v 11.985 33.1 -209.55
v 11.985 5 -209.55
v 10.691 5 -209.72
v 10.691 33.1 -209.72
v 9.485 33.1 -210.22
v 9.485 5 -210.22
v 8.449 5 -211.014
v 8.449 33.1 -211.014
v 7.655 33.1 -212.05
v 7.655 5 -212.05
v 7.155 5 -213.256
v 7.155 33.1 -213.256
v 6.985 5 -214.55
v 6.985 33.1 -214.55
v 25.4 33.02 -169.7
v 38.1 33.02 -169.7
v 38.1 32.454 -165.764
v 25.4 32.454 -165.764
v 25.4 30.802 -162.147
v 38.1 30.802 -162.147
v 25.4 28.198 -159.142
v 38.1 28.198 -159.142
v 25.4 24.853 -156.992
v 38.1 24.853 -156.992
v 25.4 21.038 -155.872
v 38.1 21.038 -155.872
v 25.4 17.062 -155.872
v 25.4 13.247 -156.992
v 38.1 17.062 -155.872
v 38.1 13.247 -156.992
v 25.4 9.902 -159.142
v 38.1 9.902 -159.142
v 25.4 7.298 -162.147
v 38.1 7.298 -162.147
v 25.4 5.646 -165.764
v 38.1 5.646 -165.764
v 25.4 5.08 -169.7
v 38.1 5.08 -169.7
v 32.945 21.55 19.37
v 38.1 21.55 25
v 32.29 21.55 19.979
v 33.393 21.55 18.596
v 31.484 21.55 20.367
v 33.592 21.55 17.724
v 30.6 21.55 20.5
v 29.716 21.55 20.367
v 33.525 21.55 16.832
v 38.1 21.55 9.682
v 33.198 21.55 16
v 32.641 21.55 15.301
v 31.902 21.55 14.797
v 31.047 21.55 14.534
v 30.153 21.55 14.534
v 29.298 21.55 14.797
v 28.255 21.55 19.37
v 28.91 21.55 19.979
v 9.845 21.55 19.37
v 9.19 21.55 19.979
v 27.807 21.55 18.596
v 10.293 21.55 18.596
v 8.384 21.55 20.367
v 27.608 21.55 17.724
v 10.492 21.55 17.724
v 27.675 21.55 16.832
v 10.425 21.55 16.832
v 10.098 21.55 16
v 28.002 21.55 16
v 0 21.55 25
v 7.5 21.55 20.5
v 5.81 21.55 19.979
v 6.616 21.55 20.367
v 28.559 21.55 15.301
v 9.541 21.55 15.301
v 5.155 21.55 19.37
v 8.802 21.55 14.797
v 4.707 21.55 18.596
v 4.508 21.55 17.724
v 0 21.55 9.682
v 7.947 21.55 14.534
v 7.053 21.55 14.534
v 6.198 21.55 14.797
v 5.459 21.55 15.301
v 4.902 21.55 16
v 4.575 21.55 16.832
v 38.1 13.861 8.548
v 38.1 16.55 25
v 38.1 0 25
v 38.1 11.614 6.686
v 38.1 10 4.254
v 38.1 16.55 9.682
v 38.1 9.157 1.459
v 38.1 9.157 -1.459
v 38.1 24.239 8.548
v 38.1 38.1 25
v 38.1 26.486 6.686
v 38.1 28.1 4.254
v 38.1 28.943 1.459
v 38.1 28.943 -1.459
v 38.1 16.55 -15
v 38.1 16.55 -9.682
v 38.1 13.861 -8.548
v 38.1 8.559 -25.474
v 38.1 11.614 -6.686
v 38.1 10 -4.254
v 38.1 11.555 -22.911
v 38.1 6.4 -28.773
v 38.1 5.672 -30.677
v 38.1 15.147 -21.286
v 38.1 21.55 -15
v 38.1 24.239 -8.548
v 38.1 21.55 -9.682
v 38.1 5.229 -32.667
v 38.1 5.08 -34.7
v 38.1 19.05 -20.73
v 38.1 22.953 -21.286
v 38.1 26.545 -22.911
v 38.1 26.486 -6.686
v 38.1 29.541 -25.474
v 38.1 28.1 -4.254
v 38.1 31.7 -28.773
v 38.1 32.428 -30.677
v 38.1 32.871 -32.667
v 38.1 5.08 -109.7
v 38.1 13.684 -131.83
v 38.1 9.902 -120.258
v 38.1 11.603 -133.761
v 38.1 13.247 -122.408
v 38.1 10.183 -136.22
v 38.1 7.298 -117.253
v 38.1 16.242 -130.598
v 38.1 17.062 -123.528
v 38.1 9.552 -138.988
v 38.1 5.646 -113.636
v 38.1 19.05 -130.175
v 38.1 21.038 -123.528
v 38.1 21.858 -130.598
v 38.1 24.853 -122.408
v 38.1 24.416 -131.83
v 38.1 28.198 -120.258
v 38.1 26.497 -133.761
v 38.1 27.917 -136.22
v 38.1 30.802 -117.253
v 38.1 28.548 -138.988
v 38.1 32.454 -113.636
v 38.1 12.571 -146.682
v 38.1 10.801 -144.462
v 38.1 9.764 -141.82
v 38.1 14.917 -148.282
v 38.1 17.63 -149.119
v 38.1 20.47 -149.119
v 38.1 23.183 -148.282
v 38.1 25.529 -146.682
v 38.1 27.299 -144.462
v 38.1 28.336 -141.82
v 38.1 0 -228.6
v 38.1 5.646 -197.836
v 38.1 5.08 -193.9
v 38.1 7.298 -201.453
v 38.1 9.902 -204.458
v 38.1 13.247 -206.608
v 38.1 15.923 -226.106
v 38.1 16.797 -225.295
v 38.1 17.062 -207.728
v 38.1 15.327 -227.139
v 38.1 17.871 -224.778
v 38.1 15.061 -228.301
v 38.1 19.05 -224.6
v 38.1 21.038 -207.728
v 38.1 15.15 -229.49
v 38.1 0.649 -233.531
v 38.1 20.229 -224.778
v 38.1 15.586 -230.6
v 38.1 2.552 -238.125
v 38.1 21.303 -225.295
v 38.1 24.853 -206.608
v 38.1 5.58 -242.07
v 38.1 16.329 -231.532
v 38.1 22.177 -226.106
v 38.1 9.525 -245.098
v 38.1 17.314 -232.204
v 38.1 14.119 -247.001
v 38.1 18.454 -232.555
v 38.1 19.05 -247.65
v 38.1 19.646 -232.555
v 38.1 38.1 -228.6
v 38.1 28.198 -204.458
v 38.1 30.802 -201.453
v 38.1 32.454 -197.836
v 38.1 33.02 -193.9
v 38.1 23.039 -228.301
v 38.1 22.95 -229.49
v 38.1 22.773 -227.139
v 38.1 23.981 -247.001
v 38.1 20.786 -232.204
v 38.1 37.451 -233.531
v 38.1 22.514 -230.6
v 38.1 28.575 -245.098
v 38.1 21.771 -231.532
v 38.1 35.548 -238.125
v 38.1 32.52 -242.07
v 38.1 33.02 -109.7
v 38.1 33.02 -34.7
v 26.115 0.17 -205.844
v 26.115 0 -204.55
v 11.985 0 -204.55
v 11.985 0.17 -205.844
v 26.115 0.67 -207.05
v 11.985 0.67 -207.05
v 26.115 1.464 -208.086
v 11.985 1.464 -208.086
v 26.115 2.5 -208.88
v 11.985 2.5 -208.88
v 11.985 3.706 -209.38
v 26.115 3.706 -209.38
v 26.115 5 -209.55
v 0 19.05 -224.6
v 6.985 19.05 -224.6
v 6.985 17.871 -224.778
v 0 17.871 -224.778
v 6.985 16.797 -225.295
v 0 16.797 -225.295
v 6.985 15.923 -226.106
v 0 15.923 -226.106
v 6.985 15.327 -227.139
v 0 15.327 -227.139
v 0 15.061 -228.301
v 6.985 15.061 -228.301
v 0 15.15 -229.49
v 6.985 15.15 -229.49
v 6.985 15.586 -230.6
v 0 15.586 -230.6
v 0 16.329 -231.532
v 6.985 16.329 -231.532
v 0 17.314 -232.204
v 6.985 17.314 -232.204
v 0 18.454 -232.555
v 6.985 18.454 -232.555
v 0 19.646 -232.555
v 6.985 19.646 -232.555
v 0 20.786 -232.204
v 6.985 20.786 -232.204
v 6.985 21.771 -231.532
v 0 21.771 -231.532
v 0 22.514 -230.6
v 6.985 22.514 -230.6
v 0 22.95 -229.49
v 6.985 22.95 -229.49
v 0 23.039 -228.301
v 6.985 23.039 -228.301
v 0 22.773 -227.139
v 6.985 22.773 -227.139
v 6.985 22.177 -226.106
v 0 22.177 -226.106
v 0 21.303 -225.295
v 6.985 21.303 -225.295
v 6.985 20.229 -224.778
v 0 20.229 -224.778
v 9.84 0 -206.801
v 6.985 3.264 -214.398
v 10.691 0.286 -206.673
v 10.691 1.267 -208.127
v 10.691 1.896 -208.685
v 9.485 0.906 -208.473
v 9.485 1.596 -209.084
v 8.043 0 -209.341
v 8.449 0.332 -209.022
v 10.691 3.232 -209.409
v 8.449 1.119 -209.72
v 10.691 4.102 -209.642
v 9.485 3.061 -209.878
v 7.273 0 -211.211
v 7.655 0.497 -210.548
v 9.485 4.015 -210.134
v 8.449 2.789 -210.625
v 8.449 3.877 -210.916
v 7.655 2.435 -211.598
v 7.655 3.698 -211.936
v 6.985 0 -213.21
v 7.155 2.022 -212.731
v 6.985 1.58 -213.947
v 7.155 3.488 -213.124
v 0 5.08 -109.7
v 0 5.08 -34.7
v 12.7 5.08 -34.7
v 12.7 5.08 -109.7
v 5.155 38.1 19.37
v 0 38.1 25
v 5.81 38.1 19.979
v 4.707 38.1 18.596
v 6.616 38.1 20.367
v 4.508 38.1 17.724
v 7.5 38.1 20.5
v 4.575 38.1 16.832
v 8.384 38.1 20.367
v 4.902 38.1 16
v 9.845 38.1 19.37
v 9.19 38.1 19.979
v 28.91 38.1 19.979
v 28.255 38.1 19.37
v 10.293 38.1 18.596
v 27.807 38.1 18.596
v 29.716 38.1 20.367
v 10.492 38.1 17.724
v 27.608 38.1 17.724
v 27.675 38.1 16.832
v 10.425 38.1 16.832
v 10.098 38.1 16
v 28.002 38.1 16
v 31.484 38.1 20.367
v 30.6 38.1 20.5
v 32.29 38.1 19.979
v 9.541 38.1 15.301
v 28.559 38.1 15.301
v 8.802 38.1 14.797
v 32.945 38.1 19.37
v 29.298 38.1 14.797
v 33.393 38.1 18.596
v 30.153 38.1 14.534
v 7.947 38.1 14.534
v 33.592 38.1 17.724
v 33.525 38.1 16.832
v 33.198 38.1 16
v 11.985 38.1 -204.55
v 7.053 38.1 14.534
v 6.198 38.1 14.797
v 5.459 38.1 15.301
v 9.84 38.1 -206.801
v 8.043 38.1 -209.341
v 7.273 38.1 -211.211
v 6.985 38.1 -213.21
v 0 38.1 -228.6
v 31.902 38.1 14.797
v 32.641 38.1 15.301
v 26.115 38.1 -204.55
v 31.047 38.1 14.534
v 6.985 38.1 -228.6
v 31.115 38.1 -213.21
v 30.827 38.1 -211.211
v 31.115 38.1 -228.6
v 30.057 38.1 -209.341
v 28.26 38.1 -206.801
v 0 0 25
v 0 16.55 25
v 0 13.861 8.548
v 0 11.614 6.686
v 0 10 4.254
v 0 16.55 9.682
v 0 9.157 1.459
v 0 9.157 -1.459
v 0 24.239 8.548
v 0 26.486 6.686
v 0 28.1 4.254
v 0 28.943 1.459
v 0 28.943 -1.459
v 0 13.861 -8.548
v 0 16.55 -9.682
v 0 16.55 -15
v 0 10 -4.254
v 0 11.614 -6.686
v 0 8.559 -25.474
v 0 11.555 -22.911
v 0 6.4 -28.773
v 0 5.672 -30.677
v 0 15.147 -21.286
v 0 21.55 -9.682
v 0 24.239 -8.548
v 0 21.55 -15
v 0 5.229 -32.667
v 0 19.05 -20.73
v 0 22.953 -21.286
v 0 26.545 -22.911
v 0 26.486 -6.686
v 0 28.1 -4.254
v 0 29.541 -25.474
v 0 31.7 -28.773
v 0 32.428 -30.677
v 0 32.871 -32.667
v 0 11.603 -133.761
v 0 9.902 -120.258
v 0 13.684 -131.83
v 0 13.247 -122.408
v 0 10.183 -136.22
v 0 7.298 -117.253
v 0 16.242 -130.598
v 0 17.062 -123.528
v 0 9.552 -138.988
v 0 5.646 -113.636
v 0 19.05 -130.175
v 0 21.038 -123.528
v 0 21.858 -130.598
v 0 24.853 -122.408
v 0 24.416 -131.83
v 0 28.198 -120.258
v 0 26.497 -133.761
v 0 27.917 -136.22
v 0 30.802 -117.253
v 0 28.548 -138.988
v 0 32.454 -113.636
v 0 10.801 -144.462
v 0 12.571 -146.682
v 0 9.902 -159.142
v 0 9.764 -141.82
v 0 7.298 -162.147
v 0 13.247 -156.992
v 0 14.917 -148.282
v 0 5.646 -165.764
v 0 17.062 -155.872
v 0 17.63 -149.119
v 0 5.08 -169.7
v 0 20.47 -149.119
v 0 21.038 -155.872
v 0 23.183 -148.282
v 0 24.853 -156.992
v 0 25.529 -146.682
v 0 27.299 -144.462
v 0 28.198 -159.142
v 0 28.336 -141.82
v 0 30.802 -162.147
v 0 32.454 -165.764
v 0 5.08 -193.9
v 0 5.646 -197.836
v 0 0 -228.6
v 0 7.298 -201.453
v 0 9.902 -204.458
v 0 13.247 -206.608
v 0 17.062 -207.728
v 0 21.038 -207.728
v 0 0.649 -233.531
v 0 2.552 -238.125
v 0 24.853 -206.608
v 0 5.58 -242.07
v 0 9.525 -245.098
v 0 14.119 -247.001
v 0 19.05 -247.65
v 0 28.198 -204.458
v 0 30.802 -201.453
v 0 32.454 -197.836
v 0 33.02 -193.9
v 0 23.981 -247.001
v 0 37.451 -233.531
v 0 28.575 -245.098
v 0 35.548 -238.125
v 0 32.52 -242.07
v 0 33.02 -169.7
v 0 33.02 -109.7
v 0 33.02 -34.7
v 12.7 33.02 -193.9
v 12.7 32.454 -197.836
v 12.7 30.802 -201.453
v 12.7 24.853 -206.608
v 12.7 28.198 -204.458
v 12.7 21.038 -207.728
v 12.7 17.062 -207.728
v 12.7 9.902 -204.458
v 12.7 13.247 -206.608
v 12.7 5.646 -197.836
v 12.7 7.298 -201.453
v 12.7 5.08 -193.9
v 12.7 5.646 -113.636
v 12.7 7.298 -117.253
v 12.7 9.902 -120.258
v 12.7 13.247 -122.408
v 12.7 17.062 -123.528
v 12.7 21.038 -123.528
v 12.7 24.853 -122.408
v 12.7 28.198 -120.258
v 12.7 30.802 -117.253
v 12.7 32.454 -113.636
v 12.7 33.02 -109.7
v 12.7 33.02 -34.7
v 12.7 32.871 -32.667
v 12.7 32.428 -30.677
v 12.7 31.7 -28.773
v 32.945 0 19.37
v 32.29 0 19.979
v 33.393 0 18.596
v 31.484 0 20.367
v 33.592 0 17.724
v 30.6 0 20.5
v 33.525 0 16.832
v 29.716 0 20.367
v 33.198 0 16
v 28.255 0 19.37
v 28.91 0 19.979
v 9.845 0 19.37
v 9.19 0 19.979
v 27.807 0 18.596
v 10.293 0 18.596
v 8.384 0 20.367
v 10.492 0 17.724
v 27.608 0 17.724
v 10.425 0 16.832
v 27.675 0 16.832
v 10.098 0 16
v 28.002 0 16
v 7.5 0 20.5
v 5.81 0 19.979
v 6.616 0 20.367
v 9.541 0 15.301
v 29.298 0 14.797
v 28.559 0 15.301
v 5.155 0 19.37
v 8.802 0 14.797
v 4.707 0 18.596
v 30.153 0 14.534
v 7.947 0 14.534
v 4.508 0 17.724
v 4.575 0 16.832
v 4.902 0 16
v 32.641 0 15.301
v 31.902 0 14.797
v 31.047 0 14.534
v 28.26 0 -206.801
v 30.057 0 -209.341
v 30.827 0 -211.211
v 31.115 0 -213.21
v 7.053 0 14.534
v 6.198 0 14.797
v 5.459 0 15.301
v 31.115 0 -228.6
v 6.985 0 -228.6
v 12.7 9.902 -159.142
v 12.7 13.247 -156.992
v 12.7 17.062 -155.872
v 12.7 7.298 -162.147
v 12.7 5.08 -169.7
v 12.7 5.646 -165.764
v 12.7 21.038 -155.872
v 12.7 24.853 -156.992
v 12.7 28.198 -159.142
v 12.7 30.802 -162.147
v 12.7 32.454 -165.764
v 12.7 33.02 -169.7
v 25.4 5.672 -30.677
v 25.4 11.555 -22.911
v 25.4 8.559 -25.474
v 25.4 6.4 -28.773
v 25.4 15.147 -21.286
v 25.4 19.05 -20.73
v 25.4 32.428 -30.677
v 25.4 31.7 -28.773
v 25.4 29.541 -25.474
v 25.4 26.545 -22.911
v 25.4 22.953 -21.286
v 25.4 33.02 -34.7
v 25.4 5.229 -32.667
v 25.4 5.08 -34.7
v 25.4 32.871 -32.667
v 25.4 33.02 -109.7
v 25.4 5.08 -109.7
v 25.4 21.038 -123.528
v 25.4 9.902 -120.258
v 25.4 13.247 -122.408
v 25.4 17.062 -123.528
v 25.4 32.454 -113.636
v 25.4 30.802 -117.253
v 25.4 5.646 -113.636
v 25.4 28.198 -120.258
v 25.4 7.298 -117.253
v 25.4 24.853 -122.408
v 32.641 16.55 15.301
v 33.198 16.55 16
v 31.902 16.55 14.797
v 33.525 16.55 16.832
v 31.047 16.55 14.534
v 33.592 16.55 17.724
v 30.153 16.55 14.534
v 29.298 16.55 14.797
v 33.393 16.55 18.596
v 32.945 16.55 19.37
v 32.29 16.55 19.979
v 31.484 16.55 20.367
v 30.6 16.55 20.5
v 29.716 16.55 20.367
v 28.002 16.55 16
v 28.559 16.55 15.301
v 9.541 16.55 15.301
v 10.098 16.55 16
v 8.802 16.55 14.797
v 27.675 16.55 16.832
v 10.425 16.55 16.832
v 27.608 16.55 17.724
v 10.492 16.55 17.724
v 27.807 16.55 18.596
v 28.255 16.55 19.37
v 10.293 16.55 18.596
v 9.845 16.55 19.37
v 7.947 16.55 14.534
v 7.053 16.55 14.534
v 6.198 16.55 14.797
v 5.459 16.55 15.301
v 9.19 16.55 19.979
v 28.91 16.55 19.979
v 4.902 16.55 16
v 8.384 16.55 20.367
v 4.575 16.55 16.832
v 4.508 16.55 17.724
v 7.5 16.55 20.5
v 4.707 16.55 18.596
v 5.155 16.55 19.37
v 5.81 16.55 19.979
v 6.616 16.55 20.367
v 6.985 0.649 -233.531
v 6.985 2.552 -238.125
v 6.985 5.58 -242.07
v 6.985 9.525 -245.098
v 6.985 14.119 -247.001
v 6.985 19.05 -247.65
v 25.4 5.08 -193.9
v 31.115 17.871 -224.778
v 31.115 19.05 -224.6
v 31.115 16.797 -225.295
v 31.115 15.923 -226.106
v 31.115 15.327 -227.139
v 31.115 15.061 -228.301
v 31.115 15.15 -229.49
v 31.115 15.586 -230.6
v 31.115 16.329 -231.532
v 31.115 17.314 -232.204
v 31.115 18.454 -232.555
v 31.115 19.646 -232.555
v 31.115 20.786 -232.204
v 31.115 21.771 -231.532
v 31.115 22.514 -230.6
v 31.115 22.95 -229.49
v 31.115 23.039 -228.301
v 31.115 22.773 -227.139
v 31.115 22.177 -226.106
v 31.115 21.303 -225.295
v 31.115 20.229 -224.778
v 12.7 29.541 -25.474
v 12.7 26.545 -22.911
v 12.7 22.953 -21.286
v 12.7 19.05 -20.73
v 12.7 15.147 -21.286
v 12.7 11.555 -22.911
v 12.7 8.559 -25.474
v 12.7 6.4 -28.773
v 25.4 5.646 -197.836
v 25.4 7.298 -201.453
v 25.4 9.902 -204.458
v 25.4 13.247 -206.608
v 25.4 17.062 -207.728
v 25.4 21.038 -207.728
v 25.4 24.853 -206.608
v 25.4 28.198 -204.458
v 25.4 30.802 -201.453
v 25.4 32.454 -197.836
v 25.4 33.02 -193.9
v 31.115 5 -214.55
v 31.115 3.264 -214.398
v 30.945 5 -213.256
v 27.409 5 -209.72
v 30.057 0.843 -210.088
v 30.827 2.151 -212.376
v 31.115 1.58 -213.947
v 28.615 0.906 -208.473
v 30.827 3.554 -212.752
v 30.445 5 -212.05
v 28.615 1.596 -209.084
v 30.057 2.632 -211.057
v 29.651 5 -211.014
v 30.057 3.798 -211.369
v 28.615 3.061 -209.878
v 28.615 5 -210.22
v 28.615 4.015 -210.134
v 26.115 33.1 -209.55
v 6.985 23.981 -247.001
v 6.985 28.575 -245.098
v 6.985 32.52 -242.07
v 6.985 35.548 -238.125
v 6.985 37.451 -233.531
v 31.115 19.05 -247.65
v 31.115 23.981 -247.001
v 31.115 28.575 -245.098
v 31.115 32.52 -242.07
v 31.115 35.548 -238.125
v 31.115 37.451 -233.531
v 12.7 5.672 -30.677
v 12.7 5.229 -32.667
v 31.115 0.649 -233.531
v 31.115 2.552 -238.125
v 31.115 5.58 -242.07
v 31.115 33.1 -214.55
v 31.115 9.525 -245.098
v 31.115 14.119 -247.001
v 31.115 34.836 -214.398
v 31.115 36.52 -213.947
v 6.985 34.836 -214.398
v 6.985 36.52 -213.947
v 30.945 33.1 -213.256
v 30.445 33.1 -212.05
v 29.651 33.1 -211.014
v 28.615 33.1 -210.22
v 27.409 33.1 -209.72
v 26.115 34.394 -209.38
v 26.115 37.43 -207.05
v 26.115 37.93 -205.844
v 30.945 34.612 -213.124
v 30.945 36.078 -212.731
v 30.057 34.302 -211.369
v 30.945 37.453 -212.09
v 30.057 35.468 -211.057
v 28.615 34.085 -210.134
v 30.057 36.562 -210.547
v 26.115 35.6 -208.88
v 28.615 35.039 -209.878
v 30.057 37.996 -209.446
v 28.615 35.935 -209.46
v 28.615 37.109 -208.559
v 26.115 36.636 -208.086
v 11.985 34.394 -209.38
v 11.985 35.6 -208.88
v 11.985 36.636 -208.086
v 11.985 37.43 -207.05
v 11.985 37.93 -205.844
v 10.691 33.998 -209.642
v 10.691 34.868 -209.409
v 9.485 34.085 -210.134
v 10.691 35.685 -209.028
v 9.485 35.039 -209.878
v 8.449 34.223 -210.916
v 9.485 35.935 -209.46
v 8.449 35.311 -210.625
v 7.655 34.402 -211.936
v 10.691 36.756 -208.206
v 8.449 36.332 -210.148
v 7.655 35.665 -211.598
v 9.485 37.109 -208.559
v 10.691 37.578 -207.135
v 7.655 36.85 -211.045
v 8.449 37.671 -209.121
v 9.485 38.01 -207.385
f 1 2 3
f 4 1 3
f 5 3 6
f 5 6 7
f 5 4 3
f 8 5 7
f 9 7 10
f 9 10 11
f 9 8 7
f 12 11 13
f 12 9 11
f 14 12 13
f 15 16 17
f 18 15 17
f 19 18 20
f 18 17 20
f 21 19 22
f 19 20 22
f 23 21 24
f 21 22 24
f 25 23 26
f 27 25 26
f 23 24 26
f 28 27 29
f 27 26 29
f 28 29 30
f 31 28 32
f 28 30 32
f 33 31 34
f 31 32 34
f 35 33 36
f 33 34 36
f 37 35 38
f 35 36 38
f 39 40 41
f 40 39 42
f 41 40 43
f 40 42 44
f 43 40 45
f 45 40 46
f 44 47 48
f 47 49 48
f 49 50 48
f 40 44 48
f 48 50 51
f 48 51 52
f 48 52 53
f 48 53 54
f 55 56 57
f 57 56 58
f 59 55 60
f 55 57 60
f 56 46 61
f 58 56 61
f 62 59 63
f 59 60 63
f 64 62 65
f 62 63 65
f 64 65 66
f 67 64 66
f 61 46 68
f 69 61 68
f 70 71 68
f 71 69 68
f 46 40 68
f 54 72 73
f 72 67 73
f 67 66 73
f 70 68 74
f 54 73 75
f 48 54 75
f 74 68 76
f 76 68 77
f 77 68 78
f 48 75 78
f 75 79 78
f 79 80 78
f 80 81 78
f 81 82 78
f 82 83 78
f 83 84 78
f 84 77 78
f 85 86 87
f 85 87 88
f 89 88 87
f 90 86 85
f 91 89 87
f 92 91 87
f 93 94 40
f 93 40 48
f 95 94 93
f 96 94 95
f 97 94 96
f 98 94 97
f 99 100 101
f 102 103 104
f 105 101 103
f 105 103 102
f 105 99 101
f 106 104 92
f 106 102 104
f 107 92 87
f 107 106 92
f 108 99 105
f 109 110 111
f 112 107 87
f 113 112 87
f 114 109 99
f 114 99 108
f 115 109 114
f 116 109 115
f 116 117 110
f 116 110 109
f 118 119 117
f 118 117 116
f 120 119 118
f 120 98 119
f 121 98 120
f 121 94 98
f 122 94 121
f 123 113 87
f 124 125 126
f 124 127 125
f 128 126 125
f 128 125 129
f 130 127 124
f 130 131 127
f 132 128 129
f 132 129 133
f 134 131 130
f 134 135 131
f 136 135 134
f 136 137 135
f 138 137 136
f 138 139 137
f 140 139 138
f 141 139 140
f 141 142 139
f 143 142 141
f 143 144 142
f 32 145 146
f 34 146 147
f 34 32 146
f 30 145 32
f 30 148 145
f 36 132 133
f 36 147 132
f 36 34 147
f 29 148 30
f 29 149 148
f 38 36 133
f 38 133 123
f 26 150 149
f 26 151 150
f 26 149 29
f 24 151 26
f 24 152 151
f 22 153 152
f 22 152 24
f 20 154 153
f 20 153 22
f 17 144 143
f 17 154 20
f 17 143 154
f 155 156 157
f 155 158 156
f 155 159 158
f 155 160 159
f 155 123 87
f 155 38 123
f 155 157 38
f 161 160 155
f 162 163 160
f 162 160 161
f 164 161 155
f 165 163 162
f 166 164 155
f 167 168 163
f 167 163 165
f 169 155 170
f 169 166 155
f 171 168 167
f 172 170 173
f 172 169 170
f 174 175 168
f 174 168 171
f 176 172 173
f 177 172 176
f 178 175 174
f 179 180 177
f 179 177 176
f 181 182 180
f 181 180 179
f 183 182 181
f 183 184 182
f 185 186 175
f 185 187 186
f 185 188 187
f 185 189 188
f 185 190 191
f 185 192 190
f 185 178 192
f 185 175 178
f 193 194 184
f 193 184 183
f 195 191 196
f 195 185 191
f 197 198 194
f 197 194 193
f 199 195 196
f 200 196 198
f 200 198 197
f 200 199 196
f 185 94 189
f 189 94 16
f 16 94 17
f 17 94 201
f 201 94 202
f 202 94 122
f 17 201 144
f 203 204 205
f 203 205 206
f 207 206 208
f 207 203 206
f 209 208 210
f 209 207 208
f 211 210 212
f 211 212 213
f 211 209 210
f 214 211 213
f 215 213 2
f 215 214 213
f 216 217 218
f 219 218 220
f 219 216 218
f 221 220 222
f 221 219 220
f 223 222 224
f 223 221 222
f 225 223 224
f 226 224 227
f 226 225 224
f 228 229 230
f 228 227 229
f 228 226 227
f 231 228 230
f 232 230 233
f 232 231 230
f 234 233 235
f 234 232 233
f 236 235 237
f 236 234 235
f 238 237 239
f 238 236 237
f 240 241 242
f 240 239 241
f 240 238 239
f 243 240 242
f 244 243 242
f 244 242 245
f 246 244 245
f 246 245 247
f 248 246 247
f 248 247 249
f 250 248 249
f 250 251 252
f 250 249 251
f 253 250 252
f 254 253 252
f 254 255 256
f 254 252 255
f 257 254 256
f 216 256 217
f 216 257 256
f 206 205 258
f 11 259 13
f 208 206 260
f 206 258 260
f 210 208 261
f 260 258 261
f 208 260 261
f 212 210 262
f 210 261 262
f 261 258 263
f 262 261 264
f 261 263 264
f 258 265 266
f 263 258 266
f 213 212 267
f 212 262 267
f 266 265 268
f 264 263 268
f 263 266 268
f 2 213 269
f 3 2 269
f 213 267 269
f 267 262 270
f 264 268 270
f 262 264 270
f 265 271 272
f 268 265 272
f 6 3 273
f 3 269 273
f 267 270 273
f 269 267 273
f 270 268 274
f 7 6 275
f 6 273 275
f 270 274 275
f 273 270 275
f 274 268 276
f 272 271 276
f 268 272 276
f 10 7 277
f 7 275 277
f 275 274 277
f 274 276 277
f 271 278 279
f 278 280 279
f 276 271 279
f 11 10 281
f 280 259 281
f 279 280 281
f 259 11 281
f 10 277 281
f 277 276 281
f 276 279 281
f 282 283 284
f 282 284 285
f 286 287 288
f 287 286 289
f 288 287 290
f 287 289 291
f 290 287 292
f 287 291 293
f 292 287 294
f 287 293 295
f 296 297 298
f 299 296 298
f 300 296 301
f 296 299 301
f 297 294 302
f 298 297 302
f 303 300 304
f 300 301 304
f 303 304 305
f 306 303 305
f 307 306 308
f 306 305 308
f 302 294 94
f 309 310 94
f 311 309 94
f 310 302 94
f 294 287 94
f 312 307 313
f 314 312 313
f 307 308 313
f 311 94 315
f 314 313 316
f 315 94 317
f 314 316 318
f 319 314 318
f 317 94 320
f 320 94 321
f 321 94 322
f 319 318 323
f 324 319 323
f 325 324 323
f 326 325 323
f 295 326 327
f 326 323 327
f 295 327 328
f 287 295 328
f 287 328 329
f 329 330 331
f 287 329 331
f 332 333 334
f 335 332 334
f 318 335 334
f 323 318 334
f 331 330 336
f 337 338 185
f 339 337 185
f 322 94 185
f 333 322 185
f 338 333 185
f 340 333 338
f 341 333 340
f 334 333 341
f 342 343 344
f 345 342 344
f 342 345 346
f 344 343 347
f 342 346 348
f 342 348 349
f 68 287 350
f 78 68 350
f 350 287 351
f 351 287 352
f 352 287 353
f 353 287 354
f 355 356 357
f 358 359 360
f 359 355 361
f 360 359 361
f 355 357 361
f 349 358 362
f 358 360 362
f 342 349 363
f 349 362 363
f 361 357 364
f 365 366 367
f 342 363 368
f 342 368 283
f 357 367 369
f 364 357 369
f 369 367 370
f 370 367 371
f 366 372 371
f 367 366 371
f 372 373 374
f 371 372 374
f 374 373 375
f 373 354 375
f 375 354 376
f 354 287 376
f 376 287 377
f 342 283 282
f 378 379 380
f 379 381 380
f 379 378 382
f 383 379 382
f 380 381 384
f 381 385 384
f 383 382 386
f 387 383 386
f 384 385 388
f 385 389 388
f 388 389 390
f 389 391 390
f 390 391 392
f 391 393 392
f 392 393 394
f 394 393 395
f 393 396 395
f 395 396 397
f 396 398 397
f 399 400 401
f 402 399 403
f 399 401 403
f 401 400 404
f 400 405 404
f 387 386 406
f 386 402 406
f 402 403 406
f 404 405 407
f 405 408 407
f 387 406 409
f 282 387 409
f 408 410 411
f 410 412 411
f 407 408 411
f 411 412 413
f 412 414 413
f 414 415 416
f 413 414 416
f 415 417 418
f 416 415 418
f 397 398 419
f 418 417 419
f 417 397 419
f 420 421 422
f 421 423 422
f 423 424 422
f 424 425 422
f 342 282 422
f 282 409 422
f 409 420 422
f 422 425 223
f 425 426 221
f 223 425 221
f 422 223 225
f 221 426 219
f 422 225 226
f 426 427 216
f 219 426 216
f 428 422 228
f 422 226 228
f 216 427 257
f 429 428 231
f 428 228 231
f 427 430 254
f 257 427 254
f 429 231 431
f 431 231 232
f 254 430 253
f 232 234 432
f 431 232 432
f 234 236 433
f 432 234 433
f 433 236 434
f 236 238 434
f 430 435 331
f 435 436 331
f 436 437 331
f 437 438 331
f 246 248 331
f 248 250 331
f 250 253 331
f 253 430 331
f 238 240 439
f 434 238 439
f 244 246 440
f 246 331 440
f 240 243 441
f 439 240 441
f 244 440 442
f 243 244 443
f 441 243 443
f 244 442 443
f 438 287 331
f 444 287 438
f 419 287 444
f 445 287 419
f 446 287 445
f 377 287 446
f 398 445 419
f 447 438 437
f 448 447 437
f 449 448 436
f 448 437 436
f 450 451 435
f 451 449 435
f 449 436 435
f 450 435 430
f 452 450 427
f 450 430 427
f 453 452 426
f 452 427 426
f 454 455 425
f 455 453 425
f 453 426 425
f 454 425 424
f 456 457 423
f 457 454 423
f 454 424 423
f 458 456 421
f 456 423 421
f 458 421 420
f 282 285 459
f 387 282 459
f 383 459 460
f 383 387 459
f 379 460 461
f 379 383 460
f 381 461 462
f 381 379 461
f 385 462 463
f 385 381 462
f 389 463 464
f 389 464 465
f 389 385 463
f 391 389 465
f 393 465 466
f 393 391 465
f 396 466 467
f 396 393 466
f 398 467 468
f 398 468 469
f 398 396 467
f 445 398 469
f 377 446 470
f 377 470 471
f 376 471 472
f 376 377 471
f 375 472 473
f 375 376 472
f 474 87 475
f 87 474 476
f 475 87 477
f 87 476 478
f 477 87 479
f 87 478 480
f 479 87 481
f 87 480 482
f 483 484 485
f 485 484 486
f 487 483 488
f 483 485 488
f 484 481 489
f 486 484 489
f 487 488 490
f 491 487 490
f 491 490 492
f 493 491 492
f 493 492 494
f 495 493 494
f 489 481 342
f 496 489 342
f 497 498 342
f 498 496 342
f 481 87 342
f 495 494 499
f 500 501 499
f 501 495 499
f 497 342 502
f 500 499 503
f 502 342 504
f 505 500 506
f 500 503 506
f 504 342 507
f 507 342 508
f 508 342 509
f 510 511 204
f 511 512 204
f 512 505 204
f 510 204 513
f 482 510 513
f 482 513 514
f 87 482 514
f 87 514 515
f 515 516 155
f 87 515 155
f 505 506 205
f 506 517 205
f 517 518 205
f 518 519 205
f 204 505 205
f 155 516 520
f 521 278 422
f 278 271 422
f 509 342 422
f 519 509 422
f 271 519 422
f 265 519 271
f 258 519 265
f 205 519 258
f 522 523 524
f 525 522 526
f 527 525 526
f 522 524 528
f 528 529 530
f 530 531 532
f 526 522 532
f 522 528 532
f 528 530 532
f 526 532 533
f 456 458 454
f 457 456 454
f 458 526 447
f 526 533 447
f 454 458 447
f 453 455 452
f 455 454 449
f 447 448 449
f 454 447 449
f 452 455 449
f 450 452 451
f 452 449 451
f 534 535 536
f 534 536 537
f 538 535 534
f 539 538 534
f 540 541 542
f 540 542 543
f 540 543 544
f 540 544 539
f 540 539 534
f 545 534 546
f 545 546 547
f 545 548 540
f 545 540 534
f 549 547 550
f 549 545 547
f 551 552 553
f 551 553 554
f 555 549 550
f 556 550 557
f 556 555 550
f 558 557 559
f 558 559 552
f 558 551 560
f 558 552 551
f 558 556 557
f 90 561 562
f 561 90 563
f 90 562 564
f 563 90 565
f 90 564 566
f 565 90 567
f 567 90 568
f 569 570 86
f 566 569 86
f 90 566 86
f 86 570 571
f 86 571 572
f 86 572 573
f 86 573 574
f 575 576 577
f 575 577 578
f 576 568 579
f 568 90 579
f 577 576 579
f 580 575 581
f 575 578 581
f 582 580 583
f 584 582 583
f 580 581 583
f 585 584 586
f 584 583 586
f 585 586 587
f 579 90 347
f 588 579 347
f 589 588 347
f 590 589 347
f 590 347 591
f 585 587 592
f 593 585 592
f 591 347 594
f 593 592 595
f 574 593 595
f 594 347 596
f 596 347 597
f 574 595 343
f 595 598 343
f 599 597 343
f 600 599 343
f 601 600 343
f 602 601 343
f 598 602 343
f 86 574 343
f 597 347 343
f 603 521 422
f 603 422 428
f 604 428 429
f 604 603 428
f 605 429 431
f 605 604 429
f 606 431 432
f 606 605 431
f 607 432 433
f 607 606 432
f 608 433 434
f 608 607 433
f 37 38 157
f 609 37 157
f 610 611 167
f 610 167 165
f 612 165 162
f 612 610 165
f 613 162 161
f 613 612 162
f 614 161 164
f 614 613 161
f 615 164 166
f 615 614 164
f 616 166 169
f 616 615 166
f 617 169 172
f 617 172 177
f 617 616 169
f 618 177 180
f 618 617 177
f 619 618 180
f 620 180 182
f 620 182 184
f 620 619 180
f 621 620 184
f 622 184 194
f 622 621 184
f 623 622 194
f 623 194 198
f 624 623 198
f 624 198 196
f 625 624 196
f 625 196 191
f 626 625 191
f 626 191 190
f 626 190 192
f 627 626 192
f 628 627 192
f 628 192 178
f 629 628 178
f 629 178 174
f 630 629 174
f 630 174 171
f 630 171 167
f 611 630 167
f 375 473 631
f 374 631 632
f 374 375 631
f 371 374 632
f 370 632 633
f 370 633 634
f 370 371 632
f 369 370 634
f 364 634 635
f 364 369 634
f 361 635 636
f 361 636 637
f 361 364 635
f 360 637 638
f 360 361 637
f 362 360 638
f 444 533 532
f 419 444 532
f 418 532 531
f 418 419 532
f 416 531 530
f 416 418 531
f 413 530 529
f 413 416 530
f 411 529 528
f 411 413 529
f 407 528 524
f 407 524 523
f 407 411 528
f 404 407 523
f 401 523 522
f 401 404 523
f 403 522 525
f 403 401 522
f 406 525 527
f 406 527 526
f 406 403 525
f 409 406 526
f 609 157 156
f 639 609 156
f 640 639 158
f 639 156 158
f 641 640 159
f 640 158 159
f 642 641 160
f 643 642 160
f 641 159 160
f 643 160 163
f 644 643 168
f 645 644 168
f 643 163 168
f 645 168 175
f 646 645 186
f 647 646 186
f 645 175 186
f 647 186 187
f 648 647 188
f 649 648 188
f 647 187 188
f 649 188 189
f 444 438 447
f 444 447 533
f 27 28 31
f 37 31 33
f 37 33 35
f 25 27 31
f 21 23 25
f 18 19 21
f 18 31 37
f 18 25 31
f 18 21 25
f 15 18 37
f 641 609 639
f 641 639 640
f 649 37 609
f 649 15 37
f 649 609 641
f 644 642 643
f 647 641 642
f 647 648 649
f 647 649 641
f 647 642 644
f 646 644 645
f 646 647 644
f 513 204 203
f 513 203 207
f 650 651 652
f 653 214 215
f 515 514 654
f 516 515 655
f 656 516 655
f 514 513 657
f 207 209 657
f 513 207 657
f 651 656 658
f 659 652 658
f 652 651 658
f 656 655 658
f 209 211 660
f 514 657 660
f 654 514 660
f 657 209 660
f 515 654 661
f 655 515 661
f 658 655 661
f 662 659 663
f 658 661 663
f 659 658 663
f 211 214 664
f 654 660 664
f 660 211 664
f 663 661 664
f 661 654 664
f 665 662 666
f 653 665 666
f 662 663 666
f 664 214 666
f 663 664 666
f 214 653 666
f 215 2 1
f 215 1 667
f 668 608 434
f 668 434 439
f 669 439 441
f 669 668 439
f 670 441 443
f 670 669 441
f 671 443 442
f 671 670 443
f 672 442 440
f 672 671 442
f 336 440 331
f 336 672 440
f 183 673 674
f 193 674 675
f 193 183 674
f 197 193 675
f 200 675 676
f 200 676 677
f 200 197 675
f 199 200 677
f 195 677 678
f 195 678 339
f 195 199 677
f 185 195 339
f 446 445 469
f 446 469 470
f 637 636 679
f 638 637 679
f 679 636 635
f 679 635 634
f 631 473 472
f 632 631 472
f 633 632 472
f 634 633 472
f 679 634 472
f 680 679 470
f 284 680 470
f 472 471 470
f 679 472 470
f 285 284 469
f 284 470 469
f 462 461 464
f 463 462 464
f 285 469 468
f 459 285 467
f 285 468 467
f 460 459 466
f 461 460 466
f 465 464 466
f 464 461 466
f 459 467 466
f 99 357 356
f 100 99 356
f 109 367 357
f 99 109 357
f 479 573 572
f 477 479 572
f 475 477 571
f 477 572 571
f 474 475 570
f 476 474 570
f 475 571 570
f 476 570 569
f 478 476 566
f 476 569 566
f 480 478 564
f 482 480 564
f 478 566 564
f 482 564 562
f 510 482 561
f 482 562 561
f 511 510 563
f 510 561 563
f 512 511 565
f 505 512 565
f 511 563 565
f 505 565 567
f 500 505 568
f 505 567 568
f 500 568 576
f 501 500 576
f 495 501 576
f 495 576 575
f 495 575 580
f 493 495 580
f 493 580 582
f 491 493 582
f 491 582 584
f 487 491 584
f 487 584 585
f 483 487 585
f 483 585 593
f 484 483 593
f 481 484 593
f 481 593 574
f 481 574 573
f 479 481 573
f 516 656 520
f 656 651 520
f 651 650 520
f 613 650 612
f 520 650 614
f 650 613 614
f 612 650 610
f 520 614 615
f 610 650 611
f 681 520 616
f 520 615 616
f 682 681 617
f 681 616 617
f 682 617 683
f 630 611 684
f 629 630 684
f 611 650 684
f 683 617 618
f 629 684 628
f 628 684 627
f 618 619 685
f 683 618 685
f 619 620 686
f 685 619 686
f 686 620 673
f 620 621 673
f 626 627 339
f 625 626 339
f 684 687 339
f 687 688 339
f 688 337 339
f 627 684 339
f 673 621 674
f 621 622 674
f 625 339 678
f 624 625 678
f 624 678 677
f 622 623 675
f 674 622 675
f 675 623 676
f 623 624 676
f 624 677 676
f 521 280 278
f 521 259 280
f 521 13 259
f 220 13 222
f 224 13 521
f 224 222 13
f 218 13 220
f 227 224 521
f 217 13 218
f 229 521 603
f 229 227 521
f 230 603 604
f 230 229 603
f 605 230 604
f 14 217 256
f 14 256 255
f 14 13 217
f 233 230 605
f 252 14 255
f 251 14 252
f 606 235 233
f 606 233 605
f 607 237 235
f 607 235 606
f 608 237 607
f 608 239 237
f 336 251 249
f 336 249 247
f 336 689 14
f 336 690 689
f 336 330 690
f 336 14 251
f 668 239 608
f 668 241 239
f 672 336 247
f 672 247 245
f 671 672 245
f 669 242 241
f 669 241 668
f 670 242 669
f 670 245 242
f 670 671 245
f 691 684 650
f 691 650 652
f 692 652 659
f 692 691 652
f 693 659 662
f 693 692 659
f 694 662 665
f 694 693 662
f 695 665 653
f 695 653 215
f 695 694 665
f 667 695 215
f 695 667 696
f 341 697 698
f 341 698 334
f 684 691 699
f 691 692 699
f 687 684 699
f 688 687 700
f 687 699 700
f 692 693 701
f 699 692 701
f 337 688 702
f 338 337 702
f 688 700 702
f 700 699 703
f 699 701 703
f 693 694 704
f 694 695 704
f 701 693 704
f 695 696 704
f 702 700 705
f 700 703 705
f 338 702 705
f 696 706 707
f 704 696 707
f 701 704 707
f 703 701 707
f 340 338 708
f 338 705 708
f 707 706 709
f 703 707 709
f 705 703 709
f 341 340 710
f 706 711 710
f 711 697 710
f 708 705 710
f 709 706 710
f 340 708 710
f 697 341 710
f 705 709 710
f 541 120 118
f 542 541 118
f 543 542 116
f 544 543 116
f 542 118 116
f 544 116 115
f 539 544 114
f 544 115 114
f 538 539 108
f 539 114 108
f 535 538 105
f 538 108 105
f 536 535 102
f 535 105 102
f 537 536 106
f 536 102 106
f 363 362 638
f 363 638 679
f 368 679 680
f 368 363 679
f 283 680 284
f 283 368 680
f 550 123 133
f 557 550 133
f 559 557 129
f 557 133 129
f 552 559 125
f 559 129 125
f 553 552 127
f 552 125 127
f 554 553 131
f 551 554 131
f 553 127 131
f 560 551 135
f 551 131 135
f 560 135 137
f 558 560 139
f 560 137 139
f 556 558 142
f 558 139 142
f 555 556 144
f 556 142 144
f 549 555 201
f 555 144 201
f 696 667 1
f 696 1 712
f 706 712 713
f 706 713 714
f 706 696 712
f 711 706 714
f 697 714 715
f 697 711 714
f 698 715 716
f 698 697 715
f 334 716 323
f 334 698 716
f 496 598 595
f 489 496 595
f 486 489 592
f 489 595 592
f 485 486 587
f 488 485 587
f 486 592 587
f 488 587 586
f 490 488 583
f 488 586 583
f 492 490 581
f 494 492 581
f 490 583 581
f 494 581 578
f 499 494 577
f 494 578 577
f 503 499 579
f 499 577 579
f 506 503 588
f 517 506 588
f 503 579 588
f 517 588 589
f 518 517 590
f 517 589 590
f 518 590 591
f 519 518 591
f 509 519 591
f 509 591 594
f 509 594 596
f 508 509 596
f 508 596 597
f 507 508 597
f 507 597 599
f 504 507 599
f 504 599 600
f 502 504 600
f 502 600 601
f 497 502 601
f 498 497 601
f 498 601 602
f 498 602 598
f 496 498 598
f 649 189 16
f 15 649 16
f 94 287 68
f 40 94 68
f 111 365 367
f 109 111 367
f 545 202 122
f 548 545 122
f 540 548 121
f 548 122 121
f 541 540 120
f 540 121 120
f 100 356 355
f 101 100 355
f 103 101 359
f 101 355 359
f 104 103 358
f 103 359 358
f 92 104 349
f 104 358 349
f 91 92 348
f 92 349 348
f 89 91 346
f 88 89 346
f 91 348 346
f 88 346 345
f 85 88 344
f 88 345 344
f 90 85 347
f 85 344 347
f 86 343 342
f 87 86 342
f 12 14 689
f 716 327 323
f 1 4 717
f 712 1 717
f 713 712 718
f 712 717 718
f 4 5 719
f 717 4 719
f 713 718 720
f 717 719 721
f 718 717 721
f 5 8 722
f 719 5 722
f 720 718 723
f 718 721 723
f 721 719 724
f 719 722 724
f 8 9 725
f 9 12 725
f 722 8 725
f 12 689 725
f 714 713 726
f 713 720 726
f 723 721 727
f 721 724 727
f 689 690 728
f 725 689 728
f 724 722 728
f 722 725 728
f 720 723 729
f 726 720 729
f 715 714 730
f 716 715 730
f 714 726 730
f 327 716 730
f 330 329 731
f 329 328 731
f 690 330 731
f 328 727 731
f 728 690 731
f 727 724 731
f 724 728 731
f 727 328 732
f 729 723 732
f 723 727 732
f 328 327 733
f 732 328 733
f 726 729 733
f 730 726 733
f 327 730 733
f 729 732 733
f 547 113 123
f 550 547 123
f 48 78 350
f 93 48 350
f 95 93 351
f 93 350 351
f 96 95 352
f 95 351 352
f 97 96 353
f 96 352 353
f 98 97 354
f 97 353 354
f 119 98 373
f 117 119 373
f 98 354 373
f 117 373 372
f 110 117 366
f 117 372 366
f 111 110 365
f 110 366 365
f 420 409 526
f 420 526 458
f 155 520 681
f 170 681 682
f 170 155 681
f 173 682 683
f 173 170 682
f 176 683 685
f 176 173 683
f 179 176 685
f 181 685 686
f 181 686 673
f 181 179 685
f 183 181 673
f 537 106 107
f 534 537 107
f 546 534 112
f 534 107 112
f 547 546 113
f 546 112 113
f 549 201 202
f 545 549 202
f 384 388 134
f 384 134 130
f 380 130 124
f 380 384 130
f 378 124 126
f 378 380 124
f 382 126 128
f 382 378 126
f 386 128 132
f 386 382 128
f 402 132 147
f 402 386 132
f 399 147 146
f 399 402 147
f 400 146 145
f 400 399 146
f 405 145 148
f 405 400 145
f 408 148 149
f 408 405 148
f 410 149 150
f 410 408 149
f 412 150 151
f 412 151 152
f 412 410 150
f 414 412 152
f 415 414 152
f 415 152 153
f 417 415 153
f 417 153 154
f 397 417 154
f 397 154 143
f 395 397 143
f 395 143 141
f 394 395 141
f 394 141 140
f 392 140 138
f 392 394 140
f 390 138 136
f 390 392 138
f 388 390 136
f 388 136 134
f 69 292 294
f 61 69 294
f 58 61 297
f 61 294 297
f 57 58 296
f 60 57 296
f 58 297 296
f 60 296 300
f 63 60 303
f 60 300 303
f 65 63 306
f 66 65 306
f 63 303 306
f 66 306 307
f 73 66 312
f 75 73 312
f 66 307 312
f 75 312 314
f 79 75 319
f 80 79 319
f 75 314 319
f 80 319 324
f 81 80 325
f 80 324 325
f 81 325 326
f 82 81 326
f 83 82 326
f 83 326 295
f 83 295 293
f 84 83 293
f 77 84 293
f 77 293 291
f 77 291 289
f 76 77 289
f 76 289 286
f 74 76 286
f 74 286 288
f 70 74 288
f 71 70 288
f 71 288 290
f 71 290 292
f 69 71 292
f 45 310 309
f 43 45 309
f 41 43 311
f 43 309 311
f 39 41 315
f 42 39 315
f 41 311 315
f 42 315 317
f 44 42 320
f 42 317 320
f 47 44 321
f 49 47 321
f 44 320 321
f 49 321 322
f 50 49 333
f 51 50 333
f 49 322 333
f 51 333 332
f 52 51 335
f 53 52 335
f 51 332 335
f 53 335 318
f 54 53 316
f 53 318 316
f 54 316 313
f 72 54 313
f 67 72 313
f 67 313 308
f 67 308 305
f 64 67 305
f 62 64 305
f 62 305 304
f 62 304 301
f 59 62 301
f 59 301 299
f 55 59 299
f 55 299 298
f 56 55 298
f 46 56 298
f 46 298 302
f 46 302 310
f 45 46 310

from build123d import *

# Parameters (mm, degrees)
SKETCH1_R           = 9.525
SKETCH1_R_2         = 4
BOSS_EXTRUDE1_DEPTH = 38.1
FILLET1_R           = 19.05
SKETCH2_W           = 24.13
SKETCH2_H           = 38.1
CUT_EXTRUDE1_DEPTH  = 254.443765952
CUT_EXTRUDE2_DEPTH  = 12.7
SKETCH4_R           = 3
CUT_EXTRUDE3_DEPTH  = 254.443765952
FILLET4_R           = 5
FILLET5_R           = 5


# Some blends are built 0.0001 mm under size
with BuildPart() as part:
    # Sketch1 → Boss-Extrude1 (new body)
    with BuildSketch(Plane(origin=(0, 0, 0), x_dir=(0, 0, -1), z_dir=(1, 0, 0))):
        with BuildLine():
            ThreePointArc((9.682458366, 16.55), (0, 9.05), (-9.682458366, 16.55))
            Line((-9.682458366, 16.55), (-25, 16.55))
            Line((-25, 16.55), (-25, 0))
            Line((-25, 0), (247.65, 0))
            Line((247.65, 0), (247.65, 38.1))
            Line((247.65, 38.1), (-25, 38.1))
            Line((-25, 38.1), (-25, 21.55))
            Line((-25, 21.55), (-9.682458366, 21.55))
            ThreePointArc((-9.682458366, 21.55), (0, 29.05), (9.682458366, 21.55))
            Line((9.682458366, 21.55), (15, 21.55))
            Line((15, 21.55), (15, 16.55))
            Line((15, 16.55), (9.682458366, 16.55))
        make_face()
        with Locations(Location((139.7, 19.05, 0), (0, 0, 180))):
            Circle(SKETCH1_R, mode=Mode.SUBTRACT)
        with Locations(Location((228.6, 19.05, 0), (0, 0, 180))):
            Circle(SKETCH1_R_2, mode=Mode.SUBTRACT)
    extrude(amount=BOSS_EXTRUDE1_DEPTH)

    # Fillet1
    fillet1_edges = [part.edges().sort_by_distance(p)[0] for p in [
        (19.05, 0, -247.65),
        (19.05, 38.1, -247.65),
    ]]
    fillet(fillet1_edges, radius=FILLET1_R - 0.0001)  # a hair under: the kernel refuses the full size

    # Sketch2 → Cut-Extrude1 (cut, through all)
    with BuildSketch(Plane(origin=(0, 38.1, 0), x_dir=(1, 0, 0), z_dir=(0, 1, 0))):
        with Locations((19.05, 228.6)):
            Rectangle(SKETCH2_W, SKETCH2_H)
    extrude(amount=-CUT_EXTRUDE1_DEPTH, mode=Mode.SUBTRACT)

    # Sketch3 → Cut-Extrude2 (cut)
    with BuildSketch(Plane(origin=(38.1, 0, 0), x_dir=(0, 0, -1), z_dir=(1, 0, 0))):
        with BuildLine():
            Line((34.7, 5.08), (109.7, 5.08))
            ThreePointArc((109.7, 5.08), (123.67, 19.05), (109.7, 33.02))
            Line((109.7, 33.02), (34.7, 33.02))
            ThreePointArc((34.7, 33.02), (20.73, 19.05), (34.7, 5.08))
        make_face()
        with BuildLine():
            Line((169.7, 5.08), (193.9, 5.08))
            ThreePointArc((193.9, 5.08), (207.87, 19.05), (193.9, 33.02))
            Line((193.9, 33.02), (169.7, 33.02))
            ThreePointArc((169.7, 33.02), (155.73, 19.05), (169.7, 5.08))
        make_face()
        with BuildLine():
            ThreePointArc((31.430916309, 19.05), (30.759207099, 25.513256042), (28.772789625, 31.700259965))
            ThreePointArc((28.772789625, 31.700259965), (20.73, 19.05), (28.772789625, 6.399740035))
            ThreePointArc((28.772789625, 6.399740035), (30.759207099, 12.586743958), (31.430916309, 19.05))
        make_face()
    cut_extrude2 = extrude(amount=-CUT_EXTRUDE2_DEPTH, mode=Mode.SUBTRACT)

    # Mirror1: Cut-Extrude2 across plane
    add(cut_extrude2.mirror(Plane(origin=(19.05, 0, 0), x_dir=(0, 0, 1), z_dir=(1, 0, 0))), mode=Mode.SUBTRACT)

    # Sketch4 → Cut-Extrude3 (cut, through all)
    with BuildSketch(Plane(origin=(0, 38.1, 0), x_dir=(1, 0, 0), z_dir=(0, 1, 0))):
        with Locations(Location((7.5, -17.5, 0), (0, 0, 270))):
            Circle(SKETCH4_R)
        with Locations(Location((30.6, -17.5, 0), (0, 0, 270))):
            Circle(SKETCH4_R)
    extrude(amount=-CUT_EXTRUDE3_DEPTH, mode=Mode.SUBTRACT)

    # Fillet4
    fillet4_edges = [part.edges().sort_by_distance(p)[0] for p in [
        (19.05, 38.1, -209.55),
        (19.05, 0, -209.55),
    ]]
    fillet(fillet4_edges, radius=FILLET4_R)

    # Fillet5
    # the kernel refuses this fillet: 5 mm, written as the material it adds along each edge
    with BuildSketch(Plane(origin=(31.115, 33.1, -209.55), x_dir=(-1, 0, 0), z_dir=(0, -1, 0))) as fillet5_piece_1:
        with BuildLine():
            CenterArc((FILLET5_R, FILLET5_R), FILLET5_R, 180, 90)
            Line((0, FILLET5_R), (0, 0))
            Line((0, 0), (FILLET5_R, 0))
        make_face()
    extrude(amount=28.1)
    with BuildSketch(Plane(origin=(6.985, 33.1, -209.55), x_dir=(1, 0, 0), z_dir=(0, -1, 0))) as fillet5_piece_2:
        with BuildLine():
            CenterArc((FILLET5_R, -FILLET5_R), FILLET5_R, 90, 90)
            Line((0, -FILLET5_R), (0, 0))
            Line((0, 0), (FILLET5_R, 0))
        make_face()
    extrude(amount=28.1)
    with BuildSketch(Plane(origin=(31.115, 5, -204.55), x_dir=(0, 0.8017442392976496, 0.597667277632826), z_dir=(0, 0.597667277632826, -0.8017442392976496))) as fillet5_piece_3_section:
        with BuildLine():
            CenterArc((5 + FILLET5_R, -FILLET5_R), FILLET5_R, 90, 90)
            Line((5 + FILLET5_R, 0), (5, 0))
            Line((5, 0), (5, -FILLET5_R))
        make_face()
    fillet5_piece_3 = revolve(axis=Axis((31.115, 5, -204.55), (1, 0, 0)), revolution_arc=233.296989237, mode=Mode.PRIVATE)
    fillet5_piece_3 = split(fillet5_piece_3, bisect_by=Plane(origin=(29.55685837, 0, -208.299694711), z_dir=(0, 1, 0)), keep=Keep.TOP, mode=Mode.PRIVATE)
    fillet5_piece_3 = fillet5_piece_3 - Plane(origin=(29.55685837, 19.05, -193.9), x_dir=(0, -1, 0), z_dir=(1, 0, 0)) * Cylinder(13.97, 41, mode=Mode.PRIVATE)
    add(fillet5_piece_3)
    with BuildSketch(Plane(origin=(6.985, 5, -204.55), x_dir=(0, 0.8017442392976496, 0.597667277632826), z_dir=(0, 0.597667277632826, -0.8017442392976496))) as fillet5_piece_4_section:
        with BuildLine():
            CenterArc((5 + FILLET5_R, FILLET5_R), FILLET5_R, 180, 90)
            Line((5, FILLET5_R), (5, 0))
            Line((5, 0), (5 + FILLET5_R, 0))
        make_face()
    fillet5_piece_4 = revolve(axis=Axis((6.985, 5, -204.55), (1, 0, 0)), revolution_arc=233.296989237, mode=Mode.PRIVATE)
    fillet5_piece_4 = split(fillet5_piece_4, bisect_by=Plane(origin=(8.543141587, 0, -208.299694664), z_dir=(0, 1, 0)), keep=Keep.TOP, mode=Mode.PRIVATE)
    fillet5_piece_4 = fillet5_piece_4 - Plane(origin=(8.543141587, 19.05, -193.9), x_dir=(0, -1, 0), z_dir=(-1, 0, 0)) * Cylinder(13.97, 41, mode=Mode.PRIVATE)
    add(fillet5_piece_4)
    with BuildSketch(Plane(origin=(31.115, 33.1, -204.55), x_dir=(0, 0, -1), z_dir=(0, -1, 0))) as fillet5_piece_5_section:
        with BuildLine():
            CenterArc((5 + FILLET5_R, -FILLET5_R), FILLET5_R, 90, 90)
            Line((5 + FILLET5_R, 0), (5, 0))
            Line((5, 0), (5, -FILLET5_R))
        make_face()
    fillet5_piece_5 = revolve(axis=Axis((31.115, 33.1, -204.55), (1, 0, 0)), revolution_arc=233.296989237, mode=Mode.PRIVATE)
    fillet5_piece_5 = split(fillet5_piece_5, bisect_by=Plane(origin=(29.556858367, 38.1, -208.299694701), z_dir=(0, -1, 0)), keep=Keep.TOP, mode=Mode.PRIVATE)
    fillet5_piece_5 = fillet5_piece_5 - Plane(origin=(29.556858367, 19.05, -193.9), x_dir=(0, -1, 0), z_dir=(1, 0, 0)) * Cylinder(13.97, 40, mode=Mode.PRIVATE)
    add(fillet5_piece_5)
    with BuildSketch(Plane(origin=(6.985, 33.1, -204.55), x_dir=(0, 0, -1), z_dir=(0, -1, 0))) as fillet5_piece_6_section:
        with BuildLine():
            CenterArc((5 + FILLET5_R, FILLET5_R), FILLET5_R, 180, 90)
            Line((5 + FILLET5_R, 0), (5, 0))
            Line((5, 0), (5, FILLET5_R))
        make_face()
    fillet5_piece_6 = revolve(axis=Axis((6.985, 33.1, -204.55), (1, 0, 0)), revolution_arc=233.296989237, mode=Mode.PRIVATE)
    fillet5_piece_6 = split(fillet5_piece_6, bisect_by=Plane(origin=(8.54314159, 38.1, -208.299694655), z_dir=(0, -1, 0)), keep=Keep.TOP, mode=Mode.PRIVATE)
    fillet5_piece_6 = fillet5_piece_6 - Plane(origin=(8.54314159, 19.05, -193.9), x_dir=(0, -1, 0), z_dir=(-1, 0, 0)) * Cylinder(13.97, 40, mode=Mode.PRIVATE)
    add(fillet5_piece_6)


solid = part.part
